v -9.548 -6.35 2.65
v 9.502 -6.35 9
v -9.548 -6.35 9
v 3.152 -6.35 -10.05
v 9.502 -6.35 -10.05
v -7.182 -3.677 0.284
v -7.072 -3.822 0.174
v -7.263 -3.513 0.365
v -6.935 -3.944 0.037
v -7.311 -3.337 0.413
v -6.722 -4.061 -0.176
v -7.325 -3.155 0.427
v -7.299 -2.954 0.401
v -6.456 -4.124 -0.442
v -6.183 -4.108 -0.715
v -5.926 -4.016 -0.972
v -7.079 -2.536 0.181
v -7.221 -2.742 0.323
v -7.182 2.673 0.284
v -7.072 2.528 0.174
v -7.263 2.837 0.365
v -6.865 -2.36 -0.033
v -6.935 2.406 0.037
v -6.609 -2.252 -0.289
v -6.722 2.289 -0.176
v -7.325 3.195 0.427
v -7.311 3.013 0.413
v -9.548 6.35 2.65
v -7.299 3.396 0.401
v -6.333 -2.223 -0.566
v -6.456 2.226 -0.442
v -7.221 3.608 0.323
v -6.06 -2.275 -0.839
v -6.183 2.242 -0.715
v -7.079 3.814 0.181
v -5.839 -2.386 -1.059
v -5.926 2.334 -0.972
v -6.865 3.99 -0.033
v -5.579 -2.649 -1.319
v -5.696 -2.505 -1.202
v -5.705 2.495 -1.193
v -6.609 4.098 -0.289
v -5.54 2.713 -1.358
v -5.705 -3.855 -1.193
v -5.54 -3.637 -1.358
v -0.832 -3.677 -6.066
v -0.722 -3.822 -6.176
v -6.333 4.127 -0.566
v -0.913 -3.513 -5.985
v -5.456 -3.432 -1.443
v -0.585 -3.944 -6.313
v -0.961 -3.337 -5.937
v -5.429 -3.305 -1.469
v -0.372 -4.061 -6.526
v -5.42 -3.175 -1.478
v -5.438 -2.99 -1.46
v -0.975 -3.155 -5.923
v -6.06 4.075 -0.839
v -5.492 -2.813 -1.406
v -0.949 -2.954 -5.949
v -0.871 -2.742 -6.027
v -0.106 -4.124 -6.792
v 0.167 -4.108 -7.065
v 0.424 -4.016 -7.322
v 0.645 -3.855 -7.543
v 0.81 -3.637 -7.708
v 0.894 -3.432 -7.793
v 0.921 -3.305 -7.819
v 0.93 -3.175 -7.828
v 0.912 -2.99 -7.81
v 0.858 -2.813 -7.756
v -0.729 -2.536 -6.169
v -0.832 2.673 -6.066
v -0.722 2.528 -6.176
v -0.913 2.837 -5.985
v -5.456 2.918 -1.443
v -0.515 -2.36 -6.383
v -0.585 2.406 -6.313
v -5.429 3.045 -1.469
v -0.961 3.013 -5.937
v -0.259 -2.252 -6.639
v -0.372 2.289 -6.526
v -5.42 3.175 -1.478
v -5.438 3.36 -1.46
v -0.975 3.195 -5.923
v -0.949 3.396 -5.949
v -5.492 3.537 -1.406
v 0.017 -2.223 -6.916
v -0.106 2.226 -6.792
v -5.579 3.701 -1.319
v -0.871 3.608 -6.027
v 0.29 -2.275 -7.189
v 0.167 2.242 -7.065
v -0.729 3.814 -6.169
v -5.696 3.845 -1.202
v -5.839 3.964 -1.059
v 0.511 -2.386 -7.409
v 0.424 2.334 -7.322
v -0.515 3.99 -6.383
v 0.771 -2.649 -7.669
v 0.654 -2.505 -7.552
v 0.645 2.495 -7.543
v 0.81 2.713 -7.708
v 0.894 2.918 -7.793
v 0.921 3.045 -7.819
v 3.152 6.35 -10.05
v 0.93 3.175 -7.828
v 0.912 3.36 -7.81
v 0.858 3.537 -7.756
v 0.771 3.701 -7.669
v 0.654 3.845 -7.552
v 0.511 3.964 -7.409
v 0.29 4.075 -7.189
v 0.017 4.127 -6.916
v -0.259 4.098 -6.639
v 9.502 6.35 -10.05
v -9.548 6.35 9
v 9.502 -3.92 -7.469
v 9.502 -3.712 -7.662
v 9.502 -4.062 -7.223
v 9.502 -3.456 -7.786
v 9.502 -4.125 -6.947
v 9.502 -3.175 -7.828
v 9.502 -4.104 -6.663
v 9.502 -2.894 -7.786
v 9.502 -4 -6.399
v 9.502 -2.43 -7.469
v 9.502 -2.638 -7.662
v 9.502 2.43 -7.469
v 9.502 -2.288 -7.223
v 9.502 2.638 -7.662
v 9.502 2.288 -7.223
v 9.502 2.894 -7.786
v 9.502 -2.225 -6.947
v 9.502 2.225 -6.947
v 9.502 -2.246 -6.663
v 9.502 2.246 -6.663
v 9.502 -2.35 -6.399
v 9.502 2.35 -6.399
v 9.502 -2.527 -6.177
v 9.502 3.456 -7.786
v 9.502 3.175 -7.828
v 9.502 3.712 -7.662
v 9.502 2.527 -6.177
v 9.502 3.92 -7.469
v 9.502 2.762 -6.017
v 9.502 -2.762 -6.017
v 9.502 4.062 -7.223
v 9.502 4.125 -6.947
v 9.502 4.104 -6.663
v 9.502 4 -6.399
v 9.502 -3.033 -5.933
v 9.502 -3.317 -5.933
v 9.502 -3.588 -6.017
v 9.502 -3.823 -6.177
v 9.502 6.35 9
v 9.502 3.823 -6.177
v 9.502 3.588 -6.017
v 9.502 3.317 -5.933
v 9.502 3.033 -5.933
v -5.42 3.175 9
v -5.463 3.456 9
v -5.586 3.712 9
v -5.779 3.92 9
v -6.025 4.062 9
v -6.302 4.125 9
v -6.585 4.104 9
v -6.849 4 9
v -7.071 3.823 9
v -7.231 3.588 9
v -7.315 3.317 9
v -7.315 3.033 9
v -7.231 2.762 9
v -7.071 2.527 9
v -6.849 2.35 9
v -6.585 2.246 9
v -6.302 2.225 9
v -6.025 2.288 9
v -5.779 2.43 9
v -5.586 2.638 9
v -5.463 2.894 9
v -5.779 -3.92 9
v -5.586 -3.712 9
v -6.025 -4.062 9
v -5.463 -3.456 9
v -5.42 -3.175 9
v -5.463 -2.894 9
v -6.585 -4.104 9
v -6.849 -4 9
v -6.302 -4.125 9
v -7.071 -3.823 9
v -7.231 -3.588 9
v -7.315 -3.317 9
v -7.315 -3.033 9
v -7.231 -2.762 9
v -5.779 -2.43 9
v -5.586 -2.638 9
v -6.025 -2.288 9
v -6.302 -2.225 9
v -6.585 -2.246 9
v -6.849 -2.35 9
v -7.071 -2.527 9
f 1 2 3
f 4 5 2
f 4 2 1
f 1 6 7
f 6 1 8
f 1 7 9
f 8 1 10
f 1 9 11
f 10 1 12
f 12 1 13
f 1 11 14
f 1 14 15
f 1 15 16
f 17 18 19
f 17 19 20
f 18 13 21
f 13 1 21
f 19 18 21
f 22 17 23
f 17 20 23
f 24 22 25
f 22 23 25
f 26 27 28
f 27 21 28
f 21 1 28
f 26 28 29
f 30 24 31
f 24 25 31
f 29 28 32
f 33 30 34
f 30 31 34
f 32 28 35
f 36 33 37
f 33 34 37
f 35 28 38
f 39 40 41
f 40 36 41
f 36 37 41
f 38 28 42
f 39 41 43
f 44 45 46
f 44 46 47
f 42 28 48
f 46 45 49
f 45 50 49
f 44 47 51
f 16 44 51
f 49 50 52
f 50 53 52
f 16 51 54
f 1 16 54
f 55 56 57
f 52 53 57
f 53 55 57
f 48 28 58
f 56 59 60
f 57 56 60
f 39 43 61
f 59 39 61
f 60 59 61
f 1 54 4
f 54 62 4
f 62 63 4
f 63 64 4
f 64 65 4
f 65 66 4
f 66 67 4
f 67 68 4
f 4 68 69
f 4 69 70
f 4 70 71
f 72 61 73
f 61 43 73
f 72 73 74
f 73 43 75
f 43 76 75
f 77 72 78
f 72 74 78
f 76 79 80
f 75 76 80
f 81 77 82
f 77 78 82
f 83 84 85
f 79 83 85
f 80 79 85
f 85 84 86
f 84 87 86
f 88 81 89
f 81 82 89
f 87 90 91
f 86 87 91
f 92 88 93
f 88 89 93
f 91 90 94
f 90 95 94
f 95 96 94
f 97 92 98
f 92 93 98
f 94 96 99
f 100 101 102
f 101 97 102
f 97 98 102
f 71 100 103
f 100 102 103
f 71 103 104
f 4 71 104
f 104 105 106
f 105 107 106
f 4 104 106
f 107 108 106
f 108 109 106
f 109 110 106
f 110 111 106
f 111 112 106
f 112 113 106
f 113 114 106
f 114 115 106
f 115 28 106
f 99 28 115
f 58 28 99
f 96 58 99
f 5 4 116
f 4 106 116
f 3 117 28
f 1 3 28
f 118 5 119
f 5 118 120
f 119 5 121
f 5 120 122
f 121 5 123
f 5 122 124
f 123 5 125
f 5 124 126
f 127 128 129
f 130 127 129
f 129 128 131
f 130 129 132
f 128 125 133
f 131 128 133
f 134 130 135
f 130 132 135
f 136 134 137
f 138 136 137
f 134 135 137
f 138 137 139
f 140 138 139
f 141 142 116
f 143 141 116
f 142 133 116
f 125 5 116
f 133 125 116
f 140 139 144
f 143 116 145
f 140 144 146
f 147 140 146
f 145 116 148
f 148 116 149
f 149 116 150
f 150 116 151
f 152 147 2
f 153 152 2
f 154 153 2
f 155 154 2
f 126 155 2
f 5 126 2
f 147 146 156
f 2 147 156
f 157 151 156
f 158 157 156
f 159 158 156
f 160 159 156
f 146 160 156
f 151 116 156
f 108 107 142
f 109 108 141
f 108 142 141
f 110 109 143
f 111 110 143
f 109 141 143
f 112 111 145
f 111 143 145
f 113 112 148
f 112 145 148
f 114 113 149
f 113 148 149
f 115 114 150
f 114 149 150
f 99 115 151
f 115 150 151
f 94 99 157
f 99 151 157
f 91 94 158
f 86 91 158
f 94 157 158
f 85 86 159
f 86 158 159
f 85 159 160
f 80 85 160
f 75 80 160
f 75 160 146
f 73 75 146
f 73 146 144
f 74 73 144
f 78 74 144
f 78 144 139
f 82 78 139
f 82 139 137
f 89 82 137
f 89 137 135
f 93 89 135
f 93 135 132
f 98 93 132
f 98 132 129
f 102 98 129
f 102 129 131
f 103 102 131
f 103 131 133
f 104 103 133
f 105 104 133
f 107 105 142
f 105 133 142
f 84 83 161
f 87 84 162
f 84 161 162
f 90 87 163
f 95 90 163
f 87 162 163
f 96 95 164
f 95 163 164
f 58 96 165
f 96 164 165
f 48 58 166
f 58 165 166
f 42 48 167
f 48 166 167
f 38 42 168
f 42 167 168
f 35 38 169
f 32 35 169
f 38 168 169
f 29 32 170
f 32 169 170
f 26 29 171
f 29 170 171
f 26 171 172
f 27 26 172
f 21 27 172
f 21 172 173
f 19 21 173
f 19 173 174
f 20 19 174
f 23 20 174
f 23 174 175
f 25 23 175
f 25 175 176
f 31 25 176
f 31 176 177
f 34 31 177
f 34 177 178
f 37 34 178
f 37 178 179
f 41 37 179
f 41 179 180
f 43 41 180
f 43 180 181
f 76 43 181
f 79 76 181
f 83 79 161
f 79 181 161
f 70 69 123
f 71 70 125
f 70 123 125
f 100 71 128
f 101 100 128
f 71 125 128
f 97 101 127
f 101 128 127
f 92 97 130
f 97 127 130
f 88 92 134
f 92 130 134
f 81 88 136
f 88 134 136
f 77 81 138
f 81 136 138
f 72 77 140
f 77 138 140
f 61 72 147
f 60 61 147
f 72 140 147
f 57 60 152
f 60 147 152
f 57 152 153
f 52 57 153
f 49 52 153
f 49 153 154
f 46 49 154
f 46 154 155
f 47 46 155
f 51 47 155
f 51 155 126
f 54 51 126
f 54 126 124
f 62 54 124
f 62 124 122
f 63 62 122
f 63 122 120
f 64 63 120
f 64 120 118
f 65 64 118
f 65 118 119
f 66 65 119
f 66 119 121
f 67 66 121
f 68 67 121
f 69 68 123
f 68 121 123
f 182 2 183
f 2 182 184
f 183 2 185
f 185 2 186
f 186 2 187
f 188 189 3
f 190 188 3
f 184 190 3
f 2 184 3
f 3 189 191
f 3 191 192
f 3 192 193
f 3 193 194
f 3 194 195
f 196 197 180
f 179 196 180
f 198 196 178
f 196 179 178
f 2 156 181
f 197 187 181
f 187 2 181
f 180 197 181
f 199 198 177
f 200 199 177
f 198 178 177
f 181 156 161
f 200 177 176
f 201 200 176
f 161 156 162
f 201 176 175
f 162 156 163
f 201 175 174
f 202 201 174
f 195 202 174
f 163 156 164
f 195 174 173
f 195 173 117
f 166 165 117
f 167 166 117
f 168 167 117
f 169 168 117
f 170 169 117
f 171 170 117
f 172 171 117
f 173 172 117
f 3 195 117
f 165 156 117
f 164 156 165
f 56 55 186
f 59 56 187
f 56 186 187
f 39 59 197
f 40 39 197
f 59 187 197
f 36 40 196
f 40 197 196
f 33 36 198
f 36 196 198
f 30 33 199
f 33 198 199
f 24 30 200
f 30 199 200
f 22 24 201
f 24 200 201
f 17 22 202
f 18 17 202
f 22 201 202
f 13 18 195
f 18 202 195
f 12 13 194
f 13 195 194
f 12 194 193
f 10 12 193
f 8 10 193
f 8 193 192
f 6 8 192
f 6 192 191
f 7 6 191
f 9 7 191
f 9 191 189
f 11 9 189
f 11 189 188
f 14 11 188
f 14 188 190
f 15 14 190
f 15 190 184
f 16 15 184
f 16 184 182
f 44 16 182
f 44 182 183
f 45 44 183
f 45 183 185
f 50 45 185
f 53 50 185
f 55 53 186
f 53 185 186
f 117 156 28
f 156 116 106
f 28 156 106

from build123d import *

# Parameters (mm, degrees)
BOSS_EXTRUDE1_DEPTH = 6.35
SKETCH2_R           = 0.9525
CUT_EXTRUDE1_DEPTH  = 23.455171572
SKETCH3_R           = 0.9525
CUT_EXTRUDE2_DEPTH  = 23.234798889


with BuildPart() as part:
    # Sketch1 → Boss-Extrude1 (new, symmetric)
    with BuildSketch(Plane(origin=(0, 0, 0), x_dir=(1, 0, 0), z_dir=(0, 1, 0))):
        Polygon((-9.547841727, -2.649640288), (3.152158273, 10.050359712), (9.502158273, 10.050359712), (9.502158273, -8.999640288), (-9.547841727, -8.999640288), align=None)
    extrude(amount=BOSS_EXTRUDE1_DEPTH, both=True)

    # Sketch2 → Cut-Extrude1 (cut, through all)
    with BuildSketch(Plane(origin=(9.502158273, 0, 0), x_dir=(0, 0, -1), z_dir=(1, 0, 0))):
        with Locations((6.875359712, 3.175)):
            Circle(SKETCH2_R)
        with Locations((6.875359712, -3.175)):
            Circle(SKETCH2_R)
    extrude(amount=-CUT_EXTRUDE1_DEPTH, mode=Mode.SUBTRACT)

    # Sketch3 → Cut-Extrude2 (cut, through all)
    with BuildSketch(Plane.XY.offset(8.999640288)):
        with Locations((-6.372841727, 3.175)):
            Circle(SKETCH3_R)
        with Locations((-6.372841727, -3.175)):
            Circle(SKETCH3_R)
    extrude(amount=-CUT_EXTRUDE2_DEPTH, mode=Mode.SUBTRACT)


solid = part.part
